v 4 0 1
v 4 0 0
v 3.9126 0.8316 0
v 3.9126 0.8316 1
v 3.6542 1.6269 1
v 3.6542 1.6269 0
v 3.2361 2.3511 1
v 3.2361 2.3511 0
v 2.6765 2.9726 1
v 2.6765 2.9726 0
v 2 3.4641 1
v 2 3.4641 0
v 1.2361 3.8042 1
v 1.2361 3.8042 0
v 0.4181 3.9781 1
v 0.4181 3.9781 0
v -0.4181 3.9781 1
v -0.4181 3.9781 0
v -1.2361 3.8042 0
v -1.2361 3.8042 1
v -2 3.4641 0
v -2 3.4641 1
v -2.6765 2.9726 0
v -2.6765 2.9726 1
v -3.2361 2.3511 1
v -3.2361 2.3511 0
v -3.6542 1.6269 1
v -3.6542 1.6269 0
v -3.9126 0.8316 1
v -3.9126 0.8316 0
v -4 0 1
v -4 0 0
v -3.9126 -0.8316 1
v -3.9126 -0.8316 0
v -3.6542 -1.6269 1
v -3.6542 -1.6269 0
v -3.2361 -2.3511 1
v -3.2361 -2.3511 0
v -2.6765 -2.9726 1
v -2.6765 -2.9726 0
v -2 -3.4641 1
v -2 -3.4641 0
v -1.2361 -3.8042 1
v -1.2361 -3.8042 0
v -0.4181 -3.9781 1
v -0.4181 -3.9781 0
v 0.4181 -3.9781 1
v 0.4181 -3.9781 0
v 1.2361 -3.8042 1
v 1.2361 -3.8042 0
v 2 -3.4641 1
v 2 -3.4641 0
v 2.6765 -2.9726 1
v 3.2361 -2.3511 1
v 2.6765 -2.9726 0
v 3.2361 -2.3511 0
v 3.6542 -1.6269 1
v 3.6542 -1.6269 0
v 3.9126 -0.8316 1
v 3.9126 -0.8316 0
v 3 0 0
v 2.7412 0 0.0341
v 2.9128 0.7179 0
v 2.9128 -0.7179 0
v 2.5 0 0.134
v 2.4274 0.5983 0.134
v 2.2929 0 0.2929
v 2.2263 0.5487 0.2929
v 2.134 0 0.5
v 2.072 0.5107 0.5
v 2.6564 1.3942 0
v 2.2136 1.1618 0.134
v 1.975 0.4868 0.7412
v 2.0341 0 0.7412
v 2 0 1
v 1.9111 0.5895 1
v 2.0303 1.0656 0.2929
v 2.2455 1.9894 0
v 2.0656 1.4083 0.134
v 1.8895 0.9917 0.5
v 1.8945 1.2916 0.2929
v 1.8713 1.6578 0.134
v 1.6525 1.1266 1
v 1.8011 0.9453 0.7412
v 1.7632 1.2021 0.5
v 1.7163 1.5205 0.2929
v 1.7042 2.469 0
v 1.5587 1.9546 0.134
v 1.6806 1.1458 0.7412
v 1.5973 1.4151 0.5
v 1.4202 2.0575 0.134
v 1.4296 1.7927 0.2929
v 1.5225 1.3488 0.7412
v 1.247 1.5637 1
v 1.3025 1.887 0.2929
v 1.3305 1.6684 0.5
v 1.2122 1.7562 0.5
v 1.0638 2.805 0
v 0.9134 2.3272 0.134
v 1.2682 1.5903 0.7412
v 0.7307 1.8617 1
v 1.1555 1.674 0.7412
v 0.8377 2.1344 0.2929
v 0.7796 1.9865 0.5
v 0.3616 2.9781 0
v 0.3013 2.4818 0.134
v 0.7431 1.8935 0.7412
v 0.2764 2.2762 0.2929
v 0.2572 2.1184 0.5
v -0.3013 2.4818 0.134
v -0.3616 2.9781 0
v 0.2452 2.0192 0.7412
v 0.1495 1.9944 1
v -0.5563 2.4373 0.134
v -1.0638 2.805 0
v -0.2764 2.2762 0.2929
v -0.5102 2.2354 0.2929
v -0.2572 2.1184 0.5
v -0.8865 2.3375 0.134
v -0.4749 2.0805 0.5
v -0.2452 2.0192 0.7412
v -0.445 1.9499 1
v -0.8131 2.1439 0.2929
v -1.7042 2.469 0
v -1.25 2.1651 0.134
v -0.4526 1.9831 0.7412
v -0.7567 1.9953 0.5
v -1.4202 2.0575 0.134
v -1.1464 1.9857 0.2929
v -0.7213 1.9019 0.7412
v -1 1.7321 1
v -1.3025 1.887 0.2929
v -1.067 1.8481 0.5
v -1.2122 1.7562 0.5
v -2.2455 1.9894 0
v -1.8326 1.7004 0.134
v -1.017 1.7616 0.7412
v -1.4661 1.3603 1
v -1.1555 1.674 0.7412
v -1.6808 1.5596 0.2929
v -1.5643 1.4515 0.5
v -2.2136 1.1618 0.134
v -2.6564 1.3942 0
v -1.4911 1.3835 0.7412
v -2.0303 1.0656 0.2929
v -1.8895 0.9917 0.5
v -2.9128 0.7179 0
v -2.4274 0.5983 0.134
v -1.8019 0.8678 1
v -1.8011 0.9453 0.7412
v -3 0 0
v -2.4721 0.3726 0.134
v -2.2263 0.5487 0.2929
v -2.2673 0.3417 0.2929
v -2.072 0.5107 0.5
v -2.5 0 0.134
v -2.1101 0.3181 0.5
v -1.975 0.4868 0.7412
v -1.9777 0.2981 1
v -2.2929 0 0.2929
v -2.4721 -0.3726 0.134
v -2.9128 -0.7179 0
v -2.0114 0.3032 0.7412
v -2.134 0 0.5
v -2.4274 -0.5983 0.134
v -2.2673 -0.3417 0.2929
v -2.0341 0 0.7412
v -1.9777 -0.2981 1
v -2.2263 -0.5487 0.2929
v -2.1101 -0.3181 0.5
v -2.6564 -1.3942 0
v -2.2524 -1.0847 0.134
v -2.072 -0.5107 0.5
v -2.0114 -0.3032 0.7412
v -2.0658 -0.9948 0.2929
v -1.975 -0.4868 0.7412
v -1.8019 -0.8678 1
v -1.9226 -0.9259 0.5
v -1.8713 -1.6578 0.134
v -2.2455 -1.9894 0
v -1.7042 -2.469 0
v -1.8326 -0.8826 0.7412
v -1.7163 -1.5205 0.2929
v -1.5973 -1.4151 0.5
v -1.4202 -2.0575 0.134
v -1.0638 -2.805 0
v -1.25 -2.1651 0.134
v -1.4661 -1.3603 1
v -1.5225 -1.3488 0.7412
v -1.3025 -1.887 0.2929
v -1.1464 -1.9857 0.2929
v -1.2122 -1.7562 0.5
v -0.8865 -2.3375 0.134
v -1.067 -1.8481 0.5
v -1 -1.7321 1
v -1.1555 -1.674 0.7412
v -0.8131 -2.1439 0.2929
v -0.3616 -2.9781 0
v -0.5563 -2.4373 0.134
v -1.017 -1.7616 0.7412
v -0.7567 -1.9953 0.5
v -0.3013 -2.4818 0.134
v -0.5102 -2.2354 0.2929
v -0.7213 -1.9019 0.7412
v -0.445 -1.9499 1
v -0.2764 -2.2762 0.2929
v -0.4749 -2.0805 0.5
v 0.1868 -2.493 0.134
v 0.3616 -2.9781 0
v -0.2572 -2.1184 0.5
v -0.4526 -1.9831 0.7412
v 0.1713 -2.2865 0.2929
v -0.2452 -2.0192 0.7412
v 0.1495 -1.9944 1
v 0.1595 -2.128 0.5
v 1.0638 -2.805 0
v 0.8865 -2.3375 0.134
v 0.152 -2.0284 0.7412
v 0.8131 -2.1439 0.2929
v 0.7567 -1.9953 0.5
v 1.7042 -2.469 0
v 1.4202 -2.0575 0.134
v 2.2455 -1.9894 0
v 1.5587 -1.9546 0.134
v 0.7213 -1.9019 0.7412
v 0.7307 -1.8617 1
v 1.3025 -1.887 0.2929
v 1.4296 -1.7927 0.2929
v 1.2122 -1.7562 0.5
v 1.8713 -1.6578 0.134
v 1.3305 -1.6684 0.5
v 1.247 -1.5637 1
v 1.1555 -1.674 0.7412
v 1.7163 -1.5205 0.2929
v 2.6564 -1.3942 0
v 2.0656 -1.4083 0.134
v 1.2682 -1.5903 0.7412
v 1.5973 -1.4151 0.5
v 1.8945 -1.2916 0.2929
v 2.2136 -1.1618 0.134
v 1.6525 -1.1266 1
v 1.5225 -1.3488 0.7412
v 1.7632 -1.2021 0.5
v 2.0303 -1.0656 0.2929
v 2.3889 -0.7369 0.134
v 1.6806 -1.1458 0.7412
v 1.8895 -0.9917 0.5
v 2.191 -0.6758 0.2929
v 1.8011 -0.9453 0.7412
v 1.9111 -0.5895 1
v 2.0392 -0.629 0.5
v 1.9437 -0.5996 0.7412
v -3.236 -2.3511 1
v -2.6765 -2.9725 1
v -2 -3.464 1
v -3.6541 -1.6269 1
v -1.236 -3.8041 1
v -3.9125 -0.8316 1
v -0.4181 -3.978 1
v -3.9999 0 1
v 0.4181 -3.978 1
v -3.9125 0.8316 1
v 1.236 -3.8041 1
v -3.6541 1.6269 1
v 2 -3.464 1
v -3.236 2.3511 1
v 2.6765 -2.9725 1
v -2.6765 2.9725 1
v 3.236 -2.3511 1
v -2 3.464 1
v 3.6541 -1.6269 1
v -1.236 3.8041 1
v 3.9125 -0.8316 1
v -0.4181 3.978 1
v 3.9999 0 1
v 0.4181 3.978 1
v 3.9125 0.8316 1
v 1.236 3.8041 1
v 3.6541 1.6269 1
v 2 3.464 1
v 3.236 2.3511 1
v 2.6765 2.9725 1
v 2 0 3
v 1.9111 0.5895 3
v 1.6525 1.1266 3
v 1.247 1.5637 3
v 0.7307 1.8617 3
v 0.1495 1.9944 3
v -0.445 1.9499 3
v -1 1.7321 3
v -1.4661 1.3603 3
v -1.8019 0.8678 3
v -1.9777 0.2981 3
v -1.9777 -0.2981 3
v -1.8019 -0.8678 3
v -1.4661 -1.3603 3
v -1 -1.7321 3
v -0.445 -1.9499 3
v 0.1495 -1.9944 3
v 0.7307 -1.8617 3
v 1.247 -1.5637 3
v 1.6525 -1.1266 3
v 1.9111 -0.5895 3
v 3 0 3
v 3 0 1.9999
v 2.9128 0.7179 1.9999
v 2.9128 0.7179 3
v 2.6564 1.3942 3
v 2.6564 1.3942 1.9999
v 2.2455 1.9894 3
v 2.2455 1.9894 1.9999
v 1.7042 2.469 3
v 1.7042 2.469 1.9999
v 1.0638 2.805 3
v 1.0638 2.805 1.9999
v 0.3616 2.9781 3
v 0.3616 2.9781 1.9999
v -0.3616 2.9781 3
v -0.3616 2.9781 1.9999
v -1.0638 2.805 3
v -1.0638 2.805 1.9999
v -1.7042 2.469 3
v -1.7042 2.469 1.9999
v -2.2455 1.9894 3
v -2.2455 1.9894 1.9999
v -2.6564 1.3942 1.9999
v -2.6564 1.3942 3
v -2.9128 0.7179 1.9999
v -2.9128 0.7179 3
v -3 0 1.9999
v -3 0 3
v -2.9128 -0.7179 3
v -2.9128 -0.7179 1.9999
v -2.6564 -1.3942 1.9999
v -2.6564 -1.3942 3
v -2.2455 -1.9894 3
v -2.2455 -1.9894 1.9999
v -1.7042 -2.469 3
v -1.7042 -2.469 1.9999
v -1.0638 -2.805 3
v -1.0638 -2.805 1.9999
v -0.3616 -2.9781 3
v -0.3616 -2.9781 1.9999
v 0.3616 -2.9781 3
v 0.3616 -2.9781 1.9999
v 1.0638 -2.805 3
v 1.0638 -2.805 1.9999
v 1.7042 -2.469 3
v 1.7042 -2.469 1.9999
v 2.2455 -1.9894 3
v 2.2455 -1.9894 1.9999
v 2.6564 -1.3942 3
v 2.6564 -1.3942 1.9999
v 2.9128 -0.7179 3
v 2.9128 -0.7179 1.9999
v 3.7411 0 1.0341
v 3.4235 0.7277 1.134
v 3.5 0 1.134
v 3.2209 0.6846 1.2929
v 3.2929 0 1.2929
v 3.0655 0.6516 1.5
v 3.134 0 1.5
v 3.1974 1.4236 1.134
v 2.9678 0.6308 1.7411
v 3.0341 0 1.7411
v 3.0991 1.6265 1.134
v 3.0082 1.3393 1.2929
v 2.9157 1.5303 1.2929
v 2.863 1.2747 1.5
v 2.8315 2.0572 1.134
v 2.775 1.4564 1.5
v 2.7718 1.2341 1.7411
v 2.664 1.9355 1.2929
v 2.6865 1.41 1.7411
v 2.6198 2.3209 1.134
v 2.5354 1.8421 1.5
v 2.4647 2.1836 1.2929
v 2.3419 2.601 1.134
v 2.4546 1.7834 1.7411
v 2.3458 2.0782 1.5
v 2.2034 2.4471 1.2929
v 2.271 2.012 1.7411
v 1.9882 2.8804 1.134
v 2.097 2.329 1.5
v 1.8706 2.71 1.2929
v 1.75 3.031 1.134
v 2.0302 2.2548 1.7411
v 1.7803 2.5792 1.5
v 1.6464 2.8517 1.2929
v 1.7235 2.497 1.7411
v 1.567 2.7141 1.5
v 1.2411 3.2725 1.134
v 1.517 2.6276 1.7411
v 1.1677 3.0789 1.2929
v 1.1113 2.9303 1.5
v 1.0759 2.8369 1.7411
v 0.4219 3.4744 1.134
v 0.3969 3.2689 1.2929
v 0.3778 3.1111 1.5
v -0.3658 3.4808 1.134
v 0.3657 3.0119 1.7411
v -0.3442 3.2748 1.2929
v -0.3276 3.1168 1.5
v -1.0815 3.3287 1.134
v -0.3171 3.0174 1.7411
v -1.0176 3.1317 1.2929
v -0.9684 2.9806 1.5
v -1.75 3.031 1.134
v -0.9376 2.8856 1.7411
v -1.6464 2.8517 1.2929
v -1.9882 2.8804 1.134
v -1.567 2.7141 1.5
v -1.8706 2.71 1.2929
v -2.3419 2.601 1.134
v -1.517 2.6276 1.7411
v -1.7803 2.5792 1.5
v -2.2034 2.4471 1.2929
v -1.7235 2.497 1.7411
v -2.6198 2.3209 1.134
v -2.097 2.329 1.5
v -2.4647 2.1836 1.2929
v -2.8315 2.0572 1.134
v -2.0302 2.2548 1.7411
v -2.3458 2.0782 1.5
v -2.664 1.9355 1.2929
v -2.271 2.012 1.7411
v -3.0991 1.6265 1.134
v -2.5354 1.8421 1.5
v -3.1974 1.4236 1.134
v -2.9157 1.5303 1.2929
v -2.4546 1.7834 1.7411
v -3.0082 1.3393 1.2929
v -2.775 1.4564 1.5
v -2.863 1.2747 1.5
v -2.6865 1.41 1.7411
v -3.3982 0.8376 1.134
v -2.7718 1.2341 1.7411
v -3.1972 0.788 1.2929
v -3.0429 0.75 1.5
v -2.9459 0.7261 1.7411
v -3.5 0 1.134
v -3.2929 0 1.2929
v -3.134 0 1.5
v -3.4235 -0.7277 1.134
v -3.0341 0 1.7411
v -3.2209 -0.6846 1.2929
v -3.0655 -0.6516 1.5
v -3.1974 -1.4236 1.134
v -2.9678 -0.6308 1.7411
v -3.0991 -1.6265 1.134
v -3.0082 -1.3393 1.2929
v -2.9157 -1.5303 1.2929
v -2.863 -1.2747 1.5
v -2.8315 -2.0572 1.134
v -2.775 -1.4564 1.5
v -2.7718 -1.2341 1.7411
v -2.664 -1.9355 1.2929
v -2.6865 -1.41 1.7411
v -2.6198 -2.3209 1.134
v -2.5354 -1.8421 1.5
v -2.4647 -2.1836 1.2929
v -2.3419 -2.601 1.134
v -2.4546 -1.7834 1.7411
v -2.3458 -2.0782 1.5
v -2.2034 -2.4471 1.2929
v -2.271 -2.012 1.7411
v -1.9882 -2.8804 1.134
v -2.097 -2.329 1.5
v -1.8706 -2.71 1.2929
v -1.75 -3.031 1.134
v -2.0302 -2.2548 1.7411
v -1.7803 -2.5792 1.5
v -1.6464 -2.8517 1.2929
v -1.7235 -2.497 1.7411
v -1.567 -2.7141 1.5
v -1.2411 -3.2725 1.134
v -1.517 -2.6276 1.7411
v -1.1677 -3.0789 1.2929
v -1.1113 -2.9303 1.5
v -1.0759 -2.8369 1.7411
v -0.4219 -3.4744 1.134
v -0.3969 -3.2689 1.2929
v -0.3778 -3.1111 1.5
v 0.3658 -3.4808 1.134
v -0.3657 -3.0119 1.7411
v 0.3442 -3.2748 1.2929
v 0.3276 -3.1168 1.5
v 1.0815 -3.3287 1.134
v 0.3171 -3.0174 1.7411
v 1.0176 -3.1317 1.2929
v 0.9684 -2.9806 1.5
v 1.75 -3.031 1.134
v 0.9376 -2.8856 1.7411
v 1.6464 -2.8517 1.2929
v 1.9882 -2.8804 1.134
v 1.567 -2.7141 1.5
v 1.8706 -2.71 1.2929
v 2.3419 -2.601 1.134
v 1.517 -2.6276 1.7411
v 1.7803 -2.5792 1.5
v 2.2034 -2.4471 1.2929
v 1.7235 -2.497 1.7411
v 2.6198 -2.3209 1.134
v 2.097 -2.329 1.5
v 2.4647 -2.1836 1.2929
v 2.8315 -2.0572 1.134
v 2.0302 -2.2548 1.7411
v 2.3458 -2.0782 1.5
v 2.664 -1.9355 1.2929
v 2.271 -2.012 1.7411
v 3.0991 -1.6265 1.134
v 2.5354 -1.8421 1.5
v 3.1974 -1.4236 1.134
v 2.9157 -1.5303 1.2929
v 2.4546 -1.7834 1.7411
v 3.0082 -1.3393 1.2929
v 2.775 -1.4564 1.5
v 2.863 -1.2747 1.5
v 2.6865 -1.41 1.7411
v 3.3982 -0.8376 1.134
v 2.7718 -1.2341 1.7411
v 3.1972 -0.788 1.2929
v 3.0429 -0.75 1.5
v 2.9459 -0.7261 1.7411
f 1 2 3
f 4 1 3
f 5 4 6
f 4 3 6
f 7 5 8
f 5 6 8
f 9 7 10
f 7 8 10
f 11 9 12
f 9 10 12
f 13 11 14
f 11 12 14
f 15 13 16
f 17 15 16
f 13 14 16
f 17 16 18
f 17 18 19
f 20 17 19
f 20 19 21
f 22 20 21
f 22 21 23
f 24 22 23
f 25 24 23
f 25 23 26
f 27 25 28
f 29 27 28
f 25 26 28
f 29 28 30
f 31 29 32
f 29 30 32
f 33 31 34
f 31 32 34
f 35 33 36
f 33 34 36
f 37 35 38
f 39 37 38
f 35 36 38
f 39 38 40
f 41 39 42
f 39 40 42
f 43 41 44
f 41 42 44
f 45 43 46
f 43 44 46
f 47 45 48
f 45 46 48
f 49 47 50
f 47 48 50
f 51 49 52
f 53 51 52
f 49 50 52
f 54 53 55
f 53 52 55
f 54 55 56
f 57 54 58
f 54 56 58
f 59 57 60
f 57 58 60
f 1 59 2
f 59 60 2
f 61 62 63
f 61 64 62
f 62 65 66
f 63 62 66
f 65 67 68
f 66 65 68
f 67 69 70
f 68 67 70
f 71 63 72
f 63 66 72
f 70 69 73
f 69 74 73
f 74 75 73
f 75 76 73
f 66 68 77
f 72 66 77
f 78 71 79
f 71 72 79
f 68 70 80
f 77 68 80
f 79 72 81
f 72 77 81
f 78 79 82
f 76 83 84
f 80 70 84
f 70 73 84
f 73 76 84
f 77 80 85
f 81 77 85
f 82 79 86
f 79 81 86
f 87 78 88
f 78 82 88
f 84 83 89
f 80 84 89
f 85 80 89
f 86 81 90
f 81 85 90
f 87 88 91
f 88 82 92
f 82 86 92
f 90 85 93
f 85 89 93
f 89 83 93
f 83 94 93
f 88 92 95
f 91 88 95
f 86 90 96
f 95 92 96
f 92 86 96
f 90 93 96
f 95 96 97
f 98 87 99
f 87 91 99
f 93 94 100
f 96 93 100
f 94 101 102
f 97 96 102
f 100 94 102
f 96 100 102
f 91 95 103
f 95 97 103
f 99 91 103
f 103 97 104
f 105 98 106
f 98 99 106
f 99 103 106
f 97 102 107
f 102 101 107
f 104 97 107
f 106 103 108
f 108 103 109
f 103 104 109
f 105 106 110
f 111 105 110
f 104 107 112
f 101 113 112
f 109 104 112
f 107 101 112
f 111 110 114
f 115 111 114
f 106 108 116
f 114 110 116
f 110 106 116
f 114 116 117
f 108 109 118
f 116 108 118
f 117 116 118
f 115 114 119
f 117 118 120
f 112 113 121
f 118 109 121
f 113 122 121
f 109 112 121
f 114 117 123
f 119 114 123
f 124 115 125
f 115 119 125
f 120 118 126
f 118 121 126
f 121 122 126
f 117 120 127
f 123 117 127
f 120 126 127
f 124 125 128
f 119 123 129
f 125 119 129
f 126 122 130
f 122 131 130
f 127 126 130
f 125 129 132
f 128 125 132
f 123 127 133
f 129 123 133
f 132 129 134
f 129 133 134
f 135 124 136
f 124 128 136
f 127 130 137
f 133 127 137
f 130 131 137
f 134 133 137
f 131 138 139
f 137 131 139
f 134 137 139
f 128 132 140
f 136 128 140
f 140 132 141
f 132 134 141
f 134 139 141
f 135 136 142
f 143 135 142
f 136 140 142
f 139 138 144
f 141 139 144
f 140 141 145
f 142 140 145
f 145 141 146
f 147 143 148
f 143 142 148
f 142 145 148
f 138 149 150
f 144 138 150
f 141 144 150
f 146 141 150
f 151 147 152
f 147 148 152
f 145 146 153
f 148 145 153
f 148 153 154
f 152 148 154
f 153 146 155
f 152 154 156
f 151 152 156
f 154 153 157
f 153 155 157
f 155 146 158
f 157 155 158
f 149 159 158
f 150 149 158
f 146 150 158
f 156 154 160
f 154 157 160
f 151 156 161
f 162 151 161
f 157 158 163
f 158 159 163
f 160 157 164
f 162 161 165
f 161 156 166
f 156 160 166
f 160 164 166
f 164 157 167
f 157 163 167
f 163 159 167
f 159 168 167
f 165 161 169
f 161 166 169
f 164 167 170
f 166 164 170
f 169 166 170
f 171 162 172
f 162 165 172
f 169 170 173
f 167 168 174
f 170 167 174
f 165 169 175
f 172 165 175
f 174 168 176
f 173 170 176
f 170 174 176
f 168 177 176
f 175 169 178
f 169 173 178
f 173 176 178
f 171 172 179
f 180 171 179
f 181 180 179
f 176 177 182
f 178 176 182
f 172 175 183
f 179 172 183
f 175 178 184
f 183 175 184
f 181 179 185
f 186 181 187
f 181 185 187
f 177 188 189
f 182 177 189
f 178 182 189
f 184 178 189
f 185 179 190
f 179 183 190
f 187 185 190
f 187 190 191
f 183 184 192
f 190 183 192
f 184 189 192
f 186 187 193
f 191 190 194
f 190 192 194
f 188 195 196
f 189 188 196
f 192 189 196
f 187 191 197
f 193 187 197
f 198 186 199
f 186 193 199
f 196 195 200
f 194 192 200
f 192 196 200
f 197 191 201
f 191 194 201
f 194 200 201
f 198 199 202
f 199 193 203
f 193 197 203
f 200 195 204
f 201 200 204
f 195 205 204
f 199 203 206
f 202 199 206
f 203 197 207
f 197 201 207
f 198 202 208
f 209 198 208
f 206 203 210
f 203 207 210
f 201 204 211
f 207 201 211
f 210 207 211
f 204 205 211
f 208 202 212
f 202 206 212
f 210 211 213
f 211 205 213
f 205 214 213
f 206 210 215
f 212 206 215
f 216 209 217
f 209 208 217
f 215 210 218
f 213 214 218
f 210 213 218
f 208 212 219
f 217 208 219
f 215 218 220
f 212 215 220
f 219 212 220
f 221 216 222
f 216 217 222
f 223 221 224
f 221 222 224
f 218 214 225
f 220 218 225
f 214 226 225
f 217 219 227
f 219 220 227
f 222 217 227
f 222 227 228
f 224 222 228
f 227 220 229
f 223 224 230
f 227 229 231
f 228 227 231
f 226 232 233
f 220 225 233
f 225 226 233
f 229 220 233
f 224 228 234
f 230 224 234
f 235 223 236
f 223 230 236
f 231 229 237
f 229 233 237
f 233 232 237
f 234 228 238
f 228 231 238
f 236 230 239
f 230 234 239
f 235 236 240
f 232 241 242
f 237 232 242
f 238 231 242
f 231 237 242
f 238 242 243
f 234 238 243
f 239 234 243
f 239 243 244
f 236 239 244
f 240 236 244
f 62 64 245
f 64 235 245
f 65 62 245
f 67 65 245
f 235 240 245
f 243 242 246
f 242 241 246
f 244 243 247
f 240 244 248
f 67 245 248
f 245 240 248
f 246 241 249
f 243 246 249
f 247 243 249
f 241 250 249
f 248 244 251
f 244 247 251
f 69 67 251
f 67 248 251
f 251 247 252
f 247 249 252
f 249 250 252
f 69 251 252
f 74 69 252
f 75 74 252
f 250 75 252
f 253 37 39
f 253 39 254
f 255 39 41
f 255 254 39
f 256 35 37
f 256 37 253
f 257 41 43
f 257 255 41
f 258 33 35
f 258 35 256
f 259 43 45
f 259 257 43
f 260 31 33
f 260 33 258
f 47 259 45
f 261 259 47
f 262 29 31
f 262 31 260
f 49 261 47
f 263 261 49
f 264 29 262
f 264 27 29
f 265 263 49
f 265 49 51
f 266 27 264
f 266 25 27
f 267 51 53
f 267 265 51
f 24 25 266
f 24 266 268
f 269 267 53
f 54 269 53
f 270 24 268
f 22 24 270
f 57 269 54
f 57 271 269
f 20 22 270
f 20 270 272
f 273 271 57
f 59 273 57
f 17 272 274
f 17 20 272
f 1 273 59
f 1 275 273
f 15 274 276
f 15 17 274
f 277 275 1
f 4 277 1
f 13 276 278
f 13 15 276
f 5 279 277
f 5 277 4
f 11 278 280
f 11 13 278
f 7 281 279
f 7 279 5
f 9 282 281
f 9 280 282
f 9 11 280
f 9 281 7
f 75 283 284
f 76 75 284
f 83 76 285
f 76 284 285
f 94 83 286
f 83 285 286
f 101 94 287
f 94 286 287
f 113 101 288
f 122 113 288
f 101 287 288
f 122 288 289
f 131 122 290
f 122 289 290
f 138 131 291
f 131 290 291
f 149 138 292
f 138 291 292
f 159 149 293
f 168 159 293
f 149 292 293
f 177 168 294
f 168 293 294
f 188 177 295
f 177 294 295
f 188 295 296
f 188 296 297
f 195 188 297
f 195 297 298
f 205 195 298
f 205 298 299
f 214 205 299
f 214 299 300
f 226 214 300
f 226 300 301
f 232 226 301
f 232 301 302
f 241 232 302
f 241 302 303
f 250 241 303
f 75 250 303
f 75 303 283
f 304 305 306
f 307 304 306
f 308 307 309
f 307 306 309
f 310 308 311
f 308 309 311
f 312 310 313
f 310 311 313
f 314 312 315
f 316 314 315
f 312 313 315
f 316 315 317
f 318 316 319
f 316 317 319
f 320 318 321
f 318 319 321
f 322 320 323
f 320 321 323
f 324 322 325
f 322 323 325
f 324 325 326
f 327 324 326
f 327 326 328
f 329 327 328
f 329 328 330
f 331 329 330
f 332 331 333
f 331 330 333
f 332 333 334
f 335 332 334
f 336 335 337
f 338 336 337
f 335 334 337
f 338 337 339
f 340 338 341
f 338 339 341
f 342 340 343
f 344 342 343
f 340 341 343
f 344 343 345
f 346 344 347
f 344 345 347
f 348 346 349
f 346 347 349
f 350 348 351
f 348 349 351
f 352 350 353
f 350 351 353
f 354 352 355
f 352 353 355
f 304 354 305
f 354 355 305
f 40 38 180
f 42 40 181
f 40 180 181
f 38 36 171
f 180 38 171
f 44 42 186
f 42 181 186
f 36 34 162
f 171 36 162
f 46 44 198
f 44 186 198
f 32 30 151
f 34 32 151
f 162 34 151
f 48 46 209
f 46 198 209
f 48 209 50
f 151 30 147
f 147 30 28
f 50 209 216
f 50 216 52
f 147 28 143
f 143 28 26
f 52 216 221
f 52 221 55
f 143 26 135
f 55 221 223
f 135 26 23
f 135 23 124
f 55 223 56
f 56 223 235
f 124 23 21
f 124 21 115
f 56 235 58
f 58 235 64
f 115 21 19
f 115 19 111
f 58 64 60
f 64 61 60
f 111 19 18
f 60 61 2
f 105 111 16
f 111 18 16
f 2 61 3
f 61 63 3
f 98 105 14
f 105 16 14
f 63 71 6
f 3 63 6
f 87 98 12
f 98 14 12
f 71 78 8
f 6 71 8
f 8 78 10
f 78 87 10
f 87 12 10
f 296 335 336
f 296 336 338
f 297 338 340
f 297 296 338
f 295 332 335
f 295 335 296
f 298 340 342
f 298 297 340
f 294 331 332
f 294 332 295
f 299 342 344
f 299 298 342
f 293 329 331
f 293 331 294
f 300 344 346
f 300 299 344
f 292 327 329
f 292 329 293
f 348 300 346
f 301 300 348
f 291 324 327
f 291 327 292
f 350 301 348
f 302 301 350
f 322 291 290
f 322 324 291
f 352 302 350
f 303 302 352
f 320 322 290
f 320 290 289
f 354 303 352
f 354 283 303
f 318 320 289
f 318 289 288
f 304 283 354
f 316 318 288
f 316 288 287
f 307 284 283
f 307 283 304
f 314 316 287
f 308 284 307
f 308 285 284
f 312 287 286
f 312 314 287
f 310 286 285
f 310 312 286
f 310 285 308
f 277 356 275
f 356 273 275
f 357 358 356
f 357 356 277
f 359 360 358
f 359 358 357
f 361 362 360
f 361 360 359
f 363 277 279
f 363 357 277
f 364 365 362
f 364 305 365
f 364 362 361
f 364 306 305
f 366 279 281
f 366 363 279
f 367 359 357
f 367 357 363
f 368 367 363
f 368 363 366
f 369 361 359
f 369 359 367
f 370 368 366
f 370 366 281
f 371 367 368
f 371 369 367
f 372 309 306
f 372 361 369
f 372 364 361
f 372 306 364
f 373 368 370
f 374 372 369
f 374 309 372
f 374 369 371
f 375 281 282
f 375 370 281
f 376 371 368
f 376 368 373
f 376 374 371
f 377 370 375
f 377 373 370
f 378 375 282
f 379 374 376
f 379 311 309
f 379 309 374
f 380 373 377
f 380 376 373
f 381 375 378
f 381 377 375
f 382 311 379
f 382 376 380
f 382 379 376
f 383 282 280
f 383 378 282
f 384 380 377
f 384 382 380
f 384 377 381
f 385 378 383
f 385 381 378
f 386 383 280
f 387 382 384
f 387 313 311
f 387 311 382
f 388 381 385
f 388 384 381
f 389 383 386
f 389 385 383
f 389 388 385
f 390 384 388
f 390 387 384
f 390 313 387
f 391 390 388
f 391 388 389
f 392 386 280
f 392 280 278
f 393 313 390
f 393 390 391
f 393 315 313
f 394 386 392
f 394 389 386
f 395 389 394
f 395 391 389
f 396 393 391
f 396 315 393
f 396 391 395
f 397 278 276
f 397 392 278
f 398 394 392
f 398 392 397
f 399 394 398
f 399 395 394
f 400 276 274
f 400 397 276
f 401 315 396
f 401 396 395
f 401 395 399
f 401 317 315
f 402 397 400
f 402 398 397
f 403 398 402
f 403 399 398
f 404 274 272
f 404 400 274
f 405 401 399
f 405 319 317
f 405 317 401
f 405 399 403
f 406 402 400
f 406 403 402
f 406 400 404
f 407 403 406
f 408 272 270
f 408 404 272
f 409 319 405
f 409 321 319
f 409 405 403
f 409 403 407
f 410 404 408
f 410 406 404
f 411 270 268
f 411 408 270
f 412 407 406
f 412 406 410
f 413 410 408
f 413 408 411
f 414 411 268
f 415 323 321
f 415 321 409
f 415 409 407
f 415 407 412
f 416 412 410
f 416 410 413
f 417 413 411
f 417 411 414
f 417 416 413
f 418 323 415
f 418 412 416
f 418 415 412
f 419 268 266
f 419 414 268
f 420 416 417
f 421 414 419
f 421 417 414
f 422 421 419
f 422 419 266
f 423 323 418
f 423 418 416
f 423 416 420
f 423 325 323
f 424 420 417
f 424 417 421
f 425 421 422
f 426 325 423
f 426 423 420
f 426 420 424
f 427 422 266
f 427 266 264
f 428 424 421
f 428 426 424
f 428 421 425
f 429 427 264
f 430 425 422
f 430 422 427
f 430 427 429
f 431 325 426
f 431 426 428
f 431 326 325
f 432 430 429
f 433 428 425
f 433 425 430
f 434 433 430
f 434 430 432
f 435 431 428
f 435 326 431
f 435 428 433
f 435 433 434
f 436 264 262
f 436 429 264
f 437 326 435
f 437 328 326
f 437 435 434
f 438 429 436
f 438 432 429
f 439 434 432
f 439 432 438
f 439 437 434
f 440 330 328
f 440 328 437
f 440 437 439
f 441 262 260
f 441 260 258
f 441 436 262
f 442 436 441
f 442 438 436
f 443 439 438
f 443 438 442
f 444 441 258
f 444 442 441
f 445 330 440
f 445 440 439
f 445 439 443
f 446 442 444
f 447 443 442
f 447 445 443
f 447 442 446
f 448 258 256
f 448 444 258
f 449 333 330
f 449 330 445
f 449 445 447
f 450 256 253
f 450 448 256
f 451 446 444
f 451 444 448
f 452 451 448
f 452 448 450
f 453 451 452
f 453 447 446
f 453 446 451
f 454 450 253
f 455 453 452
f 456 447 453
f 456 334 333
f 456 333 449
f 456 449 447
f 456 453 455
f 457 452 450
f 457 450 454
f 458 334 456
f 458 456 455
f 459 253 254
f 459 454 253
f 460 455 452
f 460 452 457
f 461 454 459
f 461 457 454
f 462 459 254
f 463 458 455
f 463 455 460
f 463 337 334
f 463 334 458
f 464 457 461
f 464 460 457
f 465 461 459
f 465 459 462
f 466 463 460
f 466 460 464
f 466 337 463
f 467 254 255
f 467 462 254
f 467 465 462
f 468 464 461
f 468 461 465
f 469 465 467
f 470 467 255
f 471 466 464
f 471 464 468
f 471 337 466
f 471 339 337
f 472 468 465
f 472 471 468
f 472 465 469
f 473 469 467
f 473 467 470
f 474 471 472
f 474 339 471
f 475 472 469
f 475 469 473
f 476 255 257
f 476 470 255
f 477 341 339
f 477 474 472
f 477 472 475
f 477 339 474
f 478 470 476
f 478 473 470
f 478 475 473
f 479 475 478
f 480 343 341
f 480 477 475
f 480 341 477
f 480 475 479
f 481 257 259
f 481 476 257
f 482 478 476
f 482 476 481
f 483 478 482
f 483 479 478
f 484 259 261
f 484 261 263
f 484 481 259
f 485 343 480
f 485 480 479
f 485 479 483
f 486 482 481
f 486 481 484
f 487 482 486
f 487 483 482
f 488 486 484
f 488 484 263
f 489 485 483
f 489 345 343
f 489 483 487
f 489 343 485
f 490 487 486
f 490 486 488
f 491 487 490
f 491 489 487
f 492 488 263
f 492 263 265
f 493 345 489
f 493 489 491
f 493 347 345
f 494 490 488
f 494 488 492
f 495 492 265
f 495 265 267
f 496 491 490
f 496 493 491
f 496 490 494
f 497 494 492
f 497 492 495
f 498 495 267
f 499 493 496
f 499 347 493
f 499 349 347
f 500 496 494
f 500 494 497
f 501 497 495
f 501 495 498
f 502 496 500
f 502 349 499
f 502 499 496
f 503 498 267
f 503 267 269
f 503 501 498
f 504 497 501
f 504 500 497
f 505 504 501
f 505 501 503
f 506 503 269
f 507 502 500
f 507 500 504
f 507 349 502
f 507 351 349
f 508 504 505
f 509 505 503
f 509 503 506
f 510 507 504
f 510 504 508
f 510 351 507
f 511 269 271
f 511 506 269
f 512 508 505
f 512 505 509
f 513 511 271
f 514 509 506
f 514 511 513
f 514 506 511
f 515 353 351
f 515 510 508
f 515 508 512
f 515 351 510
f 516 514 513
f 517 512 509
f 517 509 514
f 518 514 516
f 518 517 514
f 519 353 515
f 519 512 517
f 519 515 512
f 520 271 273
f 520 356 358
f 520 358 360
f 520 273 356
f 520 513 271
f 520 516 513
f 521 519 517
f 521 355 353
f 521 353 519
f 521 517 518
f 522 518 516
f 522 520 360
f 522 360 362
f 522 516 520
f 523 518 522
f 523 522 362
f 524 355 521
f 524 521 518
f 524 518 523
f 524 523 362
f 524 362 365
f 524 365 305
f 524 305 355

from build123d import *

# Parameters (mm, degrees)
SKETCH1_R           = 4
BOSS_EXTRUDE1_DEPTH = 1
SKETCH2_R           = 3
BOSS_EXTRUDE2_DEPTH = 2
FILLET1_R           = 1
SKETCH3_R           = 2
CUT_EXTRUDE1_DEPTH  = 4
FILLET2_R           = 1


with BuildPart() as part:
    # Sketch1 → Boss-Extrude1 (new body)
    with BuildSketch(Plane.XY):
        Circle(SKETCH1_R)
    extrude(amount=BOSS_EXTRUDE1_DEPTH)

    # Sketch2 → Boss-Extrude2 (add)
    with BuildSketch(Plane.XY.offset(1)):
        Circle(SKETCH2_R)
    extrude(amount=BOSS_EXTRUDE2_DEPTH)

    # Fillet1
    fillet1_edges = [part.edges().sort_by_distance(p)[0] for p in [
        (-3, 0, 1),
    ]]
    fillet(fillet1_edges, radius=FILLET1_R - 0.0001)  # a hair under: the kernel refuses the full size

    # Sketch3 → Cut-Extrude1 (cut)
    with BuildSketch(Plane.XY.offset(3)):
        Circle(SKETCH3_R)
    extrude(amount=-CUT_EXTRUDE1_DEPTH, mode=Mode.SUBTRACT)

    # Fillet2
    fillet2_edges = [part.edges().sort_by_distance(p)[0] for p in [
        (-2, 0, 0),
    ]]
    fillet(fillet2_edges, radius=FILLET2_R)


solid = part.part
